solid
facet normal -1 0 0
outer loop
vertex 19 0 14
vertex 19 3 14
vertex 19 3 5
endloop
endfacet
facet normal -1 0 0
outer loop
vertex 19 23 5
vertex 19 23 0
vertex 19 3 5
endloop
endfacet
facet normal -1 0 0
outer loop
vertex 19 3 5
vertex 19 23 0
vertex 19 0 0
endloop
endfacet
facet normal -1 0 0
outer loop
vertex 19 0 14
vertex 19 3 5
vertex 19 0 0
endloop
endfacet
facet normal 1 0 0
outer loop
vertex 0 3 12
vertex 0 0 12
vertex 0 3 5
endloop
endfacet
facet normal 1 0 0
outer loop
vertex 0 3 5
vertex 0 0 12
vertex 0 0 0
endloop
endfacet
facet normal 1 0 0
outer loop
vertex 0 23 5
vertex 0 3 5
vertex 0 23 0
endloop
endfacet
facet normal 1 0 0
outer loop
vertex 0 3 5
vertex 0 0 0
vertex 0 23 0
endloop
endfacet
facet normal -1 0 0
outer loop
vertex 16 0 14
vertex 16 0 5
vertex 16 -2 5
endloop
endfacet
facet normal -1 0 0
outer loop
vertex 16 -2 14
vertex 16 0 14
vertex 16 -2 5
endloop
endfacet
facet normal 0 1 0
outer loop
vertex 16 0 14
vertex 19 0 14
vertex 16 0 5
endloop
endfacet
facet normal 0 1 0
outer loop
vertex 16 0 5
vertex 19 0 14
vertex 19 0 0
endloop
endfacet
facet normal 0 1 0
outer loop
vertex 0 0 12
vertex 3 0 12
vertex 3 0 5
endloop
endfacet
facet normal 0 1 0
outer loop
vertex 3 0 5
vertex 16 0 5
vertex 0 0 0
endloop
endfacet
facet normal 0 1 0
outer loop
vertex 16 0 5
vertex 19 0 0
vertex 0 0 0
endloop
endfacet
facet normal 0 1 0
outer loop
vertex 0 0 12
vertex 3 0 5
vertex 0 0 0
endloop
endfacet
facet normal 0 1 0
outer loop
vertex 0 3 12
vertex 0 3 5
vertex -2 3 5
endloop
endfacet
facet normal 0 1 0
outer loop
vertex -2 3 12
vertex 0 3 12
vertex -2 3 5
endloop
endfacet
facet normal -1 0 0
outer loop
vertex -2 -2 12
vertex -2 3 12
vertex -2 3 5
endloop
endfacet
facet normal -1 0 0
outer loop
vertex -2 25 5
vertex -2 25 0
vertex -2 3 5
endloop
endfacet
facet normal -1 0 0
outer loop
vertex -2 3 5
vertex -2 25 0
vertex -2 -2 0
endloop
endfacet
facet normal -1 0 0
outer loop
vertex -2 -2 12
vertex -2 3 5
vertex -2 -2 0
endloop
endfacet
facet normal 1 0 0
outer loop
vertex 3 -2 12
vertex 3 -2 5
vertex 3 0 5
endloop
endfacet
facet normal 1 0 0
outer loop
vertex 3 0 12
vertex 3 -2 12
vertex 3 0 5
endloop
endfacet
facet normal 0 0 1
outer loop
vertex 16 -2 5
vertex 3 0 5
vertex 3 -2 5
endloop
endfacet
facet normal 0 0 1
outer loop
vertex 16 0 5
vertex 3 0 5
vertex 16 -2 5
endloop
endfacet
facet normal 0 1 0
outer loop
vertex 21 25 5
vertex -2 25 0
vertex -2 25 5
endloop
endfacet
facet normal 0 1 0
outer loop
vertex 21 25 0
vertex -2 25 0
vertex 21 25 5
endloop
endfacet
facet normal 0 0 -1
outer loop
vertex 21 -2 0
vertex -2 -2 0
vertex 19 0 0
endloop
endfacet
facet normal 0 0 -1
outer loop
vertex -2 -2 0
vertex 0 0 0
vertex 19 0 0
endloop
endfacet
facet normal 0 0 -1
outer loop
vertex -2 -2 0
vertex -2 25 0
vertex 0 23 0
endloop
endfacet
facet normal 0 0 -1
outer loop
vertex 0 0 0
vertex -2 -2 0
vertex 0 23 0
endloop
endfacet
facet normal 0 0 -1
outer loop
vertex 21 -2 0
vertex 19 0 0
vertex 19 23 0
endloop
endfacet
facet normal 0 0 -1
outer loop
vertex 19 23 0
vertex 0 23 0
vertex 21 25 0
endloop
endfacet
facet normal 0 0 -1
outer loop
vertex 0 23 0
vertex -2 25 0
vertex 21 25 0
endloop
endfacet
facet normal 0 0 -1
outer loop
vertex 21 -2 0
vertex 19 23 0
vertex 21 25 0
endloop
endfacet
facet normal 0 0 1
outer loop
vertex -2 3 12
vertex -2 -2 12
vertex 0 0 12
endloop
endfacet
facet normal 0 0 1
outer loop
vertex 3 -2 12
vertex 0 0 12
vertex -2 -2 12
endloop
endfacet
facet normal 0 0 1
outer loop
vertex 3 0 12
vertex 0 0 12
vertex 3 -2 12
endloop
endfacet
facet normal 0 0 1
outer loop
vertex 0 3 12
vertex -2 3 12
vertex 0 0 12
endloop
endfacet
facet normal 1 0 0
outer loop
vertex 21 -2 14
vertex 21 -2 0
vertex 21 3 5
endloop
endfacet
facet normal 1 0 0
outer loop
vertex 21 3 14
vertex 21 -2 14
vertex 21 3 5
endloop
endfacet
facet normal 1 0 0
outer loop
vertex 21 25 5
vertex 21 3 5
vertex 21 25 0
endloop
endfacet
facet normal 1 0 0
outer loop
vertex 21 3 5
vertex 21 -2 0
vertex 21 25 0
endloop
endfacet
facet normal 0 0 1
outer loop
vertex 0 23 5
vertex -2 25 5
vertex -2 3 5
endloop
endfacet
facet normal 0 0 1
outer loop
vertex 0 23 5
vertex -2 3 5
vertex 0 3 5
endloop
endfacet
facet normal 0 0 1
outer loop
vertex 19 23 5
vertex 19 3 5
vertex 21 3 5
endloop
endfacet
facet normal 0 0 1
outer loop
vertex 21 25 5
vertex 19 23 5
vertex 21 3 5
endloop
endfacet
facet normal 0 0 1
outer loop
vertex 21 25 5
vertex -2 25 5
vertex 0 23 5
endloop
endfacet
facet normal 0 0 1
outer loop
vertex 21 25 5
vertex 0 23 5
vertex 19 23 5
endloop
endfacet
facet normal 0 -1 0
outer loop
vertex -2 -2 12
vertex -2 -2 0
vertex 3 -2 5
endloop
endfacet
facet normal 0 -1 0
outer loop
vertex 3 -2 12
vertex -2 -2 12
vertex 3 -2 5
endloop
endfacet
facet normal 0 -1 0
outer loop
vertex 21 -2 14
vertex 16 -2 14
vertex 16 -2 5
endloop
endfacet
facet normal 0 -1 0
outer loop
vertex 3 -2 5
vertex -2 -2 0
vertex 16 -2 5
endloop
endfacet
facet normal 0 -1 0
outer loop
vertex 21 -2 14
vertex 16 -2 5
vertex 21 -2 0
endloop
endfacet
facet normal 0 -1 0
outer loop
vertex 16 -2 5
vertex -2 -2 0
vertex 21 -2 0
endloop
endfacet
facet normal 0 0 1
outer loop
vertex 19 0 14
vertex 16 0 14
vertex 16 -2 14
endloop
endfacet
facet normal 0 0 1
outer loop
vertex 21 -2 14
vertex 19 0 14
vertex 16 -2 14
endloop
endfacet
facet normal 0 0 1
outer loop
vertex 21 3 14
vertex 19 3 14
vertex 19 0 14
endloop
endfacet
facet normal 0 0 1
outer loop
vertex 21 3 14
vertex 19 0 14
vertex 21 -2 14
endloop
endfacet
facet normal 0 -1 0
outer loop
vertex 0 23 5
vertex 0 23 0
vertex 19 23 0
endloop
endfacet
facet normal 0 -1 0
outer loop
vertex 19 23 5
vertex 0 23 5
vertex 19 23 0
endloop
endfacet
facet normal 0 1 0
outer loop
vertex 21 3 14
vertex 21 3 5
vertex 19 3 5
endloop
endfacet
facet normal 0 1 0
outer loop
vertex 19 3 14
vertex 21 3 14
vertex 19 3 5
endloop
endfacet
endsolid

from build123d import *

# Parameters (mm, degrees)
F0_W     = 23
F0_H     = 27
F0_W_2   = 19
F0_H_2   = 23
F1_DEPTH = 5
F3_DEPTH = 7
F5_DEPTH = 9


with BuildPart() as f1:
    # F0 (on Top) → F1 (new body)
    with BuildSketch(Plane.XY):
        with Locations((9.5, 11.5)):
            Rectangle(F0_W, F0_H)
        with Locations((9.5, 11.5)):
            Rectangle(F0_W_2, F0_H_2, mode=Mode.SUBTRACT)
    extrude(amount=F1_DEPTH)

    # F2 (on face) → F3 (join)
    with BuildSketch(Plane.XY.offset(5)):
        Polygon((3, 0), (0, 0), (0, 3), (-2, 3), (-2, -2), (3, -2), align=None)
    extrude(amount=F3_DEPTH)

    # F4 (on face) → F5 (join)
    with BuildSketch(Plane.XY.offset(5)):
        Polygon((19, 3), (19, 0), (16, 0), (16, -2), (21, -2), (21, 3), align=None)
    extrude(amount=F5_DEPTH)


solid = f1.part
